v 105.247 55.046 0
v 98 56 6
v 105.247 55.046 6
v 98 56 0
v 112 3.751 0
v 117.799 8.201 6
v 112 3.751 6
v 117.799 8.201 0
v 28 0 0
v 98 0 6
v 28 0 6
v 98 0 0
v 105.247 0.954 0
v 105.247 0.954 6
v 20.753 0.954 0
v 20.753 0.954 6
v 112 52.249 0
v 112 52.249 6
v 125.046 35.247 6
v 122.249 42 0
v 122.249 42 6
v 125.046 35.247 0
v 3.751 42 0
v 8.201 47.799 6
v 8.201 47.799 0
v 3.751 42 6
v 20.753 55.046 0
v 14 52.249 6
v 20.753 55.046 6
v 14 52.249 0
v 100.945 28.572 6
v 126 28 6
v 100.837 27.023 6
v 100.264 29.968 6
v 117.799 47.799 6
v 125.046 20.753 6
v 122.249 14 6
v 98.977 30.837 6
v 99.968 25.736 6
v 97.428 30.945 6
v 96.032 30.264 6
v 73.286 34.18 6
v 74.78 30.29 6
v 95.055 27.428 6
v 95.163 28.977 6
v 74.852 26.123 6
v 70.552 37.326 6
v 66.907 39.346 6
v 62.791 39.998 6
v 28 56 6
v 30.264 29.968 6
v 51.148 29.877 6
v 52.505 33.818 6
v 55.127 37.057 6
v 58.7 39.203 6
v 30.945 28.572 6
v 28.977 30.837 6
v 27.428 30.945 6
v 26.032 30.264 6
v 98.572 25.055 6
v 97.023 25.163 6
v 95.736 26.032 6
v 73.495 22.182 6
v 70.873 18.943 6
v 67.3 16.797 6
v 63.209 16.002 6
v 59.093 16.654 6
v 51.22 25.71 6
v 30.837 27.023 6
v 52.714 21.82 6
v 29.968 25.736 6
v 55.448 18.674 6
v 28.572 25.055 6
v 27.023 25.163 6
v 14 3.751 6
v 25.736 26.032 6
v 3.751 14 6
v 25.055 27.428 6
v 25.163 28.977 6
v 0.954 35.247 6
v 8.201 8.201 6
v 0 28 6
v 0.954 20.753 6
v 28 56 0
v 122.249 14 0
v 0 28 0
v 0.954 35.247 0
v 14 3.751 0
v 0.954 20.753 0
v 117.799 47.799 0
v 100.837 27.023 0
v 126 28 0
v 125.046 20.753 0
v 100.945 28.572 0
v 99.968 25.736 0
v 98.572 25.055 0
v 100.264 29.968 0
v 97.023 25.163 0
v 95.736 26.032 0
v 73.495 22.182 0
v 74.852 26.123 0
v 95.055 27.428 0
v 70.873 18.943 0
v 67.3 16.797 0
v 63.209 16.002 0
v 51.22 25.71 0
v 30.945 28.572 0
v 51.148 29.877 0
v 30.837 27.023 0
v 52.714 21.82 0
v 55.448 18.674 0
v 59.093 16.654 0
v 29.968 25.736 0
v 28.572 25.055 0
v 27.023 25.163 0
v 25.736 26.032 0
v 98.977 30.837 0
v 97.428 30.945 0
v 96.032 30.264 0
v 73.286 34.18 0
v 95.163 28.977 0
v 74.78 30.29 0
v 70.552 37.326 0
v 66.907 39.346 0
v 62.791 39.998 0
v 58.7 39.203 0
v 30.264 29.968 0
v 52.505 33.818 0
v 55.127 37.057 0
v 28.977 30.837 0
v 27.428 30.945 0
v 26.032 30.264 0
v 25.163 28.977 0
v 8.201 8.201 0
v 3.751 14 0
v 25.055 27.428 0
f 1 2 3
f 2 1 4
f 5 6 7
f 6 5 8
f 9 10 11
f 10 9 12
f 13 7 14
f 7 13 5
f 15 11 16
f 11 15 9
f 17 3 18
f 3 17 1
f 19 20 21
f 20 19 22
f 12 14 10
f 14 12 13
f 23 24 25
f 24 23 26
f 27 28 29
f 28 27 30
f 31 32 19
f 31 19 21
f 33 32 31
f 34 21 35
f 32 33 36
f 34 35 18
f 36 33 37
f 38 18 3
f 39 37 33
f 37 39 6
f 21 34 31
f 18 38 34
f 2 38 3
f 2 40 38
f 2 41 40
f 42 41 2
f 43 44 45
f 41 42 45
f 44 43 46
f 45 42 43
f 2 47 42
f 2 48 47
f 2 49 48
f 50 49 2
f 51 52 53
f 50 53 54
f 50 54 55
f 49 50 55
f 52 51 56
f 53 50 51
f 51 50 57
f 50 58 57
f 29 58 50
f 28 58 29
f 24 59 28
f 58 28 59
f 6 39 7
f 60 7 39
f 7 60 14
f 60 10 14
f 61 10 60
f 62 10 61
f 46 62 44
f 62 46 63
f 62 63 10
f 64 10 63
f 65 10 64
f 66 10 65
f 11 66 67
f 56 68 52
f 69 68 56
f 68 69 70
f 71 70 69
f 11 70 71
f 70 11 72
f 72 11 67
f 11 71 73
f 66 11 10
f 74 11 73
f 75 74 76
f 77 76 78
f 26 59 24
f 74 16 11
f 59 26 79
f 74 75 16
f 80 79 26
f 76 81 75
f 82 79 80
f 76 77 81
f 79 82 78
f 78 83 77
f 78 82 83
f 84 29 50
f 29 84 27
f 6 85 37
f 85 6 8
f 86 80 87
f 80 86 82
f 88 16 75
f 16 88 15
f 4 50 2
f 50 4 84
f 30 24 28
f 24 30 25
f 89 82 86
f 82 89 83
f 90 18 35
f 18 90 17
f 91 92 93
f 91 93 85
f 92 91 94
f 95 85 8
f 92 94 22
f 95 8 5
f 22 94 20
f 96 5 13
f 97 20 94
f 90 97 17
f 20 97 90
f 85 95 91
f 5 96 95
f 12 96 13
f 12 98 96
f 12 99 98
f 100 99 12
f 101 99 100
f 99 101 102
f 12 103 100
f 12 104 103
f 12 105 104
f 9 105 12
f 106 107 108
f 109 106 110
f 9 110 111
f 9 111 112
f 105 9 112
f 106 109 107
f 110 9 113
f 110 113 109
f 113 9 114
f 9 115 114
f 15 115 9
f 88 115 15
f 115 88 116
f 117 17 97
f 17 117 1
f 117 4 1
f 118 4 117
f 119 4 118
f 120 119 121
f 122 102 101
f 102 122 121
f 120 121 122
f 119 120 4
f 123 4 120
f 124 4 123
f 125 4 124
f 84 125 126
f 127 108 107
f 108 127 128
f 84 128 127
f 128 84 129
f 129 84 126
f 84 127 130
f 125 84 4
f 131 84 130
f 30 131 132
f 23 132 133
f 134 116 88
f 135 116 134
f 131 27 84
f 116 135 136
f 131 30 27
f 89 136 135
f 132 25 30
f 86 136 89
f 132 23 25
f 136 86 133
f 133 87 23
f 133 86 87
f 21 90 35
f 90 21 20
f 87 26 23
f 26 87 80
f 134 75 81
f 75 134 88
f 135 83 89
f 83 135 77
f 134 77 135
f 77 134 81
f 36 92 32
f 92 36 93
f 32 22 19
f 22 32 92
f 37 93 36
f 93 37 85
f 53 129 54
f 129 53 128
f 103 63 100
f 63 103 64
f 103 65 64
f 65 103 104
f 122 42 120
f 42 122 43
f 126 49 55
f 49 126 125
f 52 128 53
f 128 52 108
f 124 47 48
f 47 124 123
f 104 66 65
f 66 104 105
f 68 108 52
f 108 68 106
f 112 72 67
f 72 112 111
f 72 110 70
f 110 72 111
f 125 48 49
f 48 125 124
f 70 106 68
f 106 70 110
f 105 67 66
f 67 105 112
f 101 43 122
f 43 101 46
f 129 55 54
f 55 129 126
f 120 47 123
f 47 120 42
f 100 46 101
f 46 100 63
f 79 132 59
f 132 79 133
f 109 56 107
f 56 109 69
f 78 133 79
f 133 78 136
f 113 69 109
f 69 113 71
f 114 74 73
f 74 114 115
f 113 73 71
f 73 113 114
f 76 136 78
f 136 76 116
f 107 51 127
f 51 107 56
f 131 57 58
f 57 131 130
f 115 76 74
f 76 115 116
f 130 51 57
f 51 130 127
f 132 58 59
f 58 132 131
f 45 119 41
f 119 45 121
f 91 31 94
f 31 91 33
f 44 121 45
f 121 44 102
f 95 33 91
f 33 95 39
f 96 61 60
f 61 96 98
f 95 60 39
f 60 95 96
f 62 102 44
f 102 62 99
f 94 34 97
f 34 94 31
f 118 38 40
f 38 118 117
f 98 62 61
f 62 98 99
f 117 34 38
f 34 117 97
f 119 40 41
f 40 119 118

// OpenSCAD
$fn = 32;

// ----------------------------------------------------------------------
// Spacer plate: obround span 70, caps R28
// ----------------------------------------------------------------------

// --- parameters (mm) ---
bore_r = 12;              // centre bore radius
bolt_r = 3;               // bolt hole radius
plate_t = 6;              // plate thickness, Z (extrusion height)
span = 70;                // obround span
cap_r = 28;               // cap radius
fit_tol = 0.1;            // declared fit tolerance (prompt contract)
free_tol = 0.5;           // declared free tolerance (prompt contract)

profile = [[28, 56], [20.753, 55.046], [14, 52.249], [8.201, 47.799], [3.751, 42], [0.954, 35.247], [0, 28], [0.954, 20.753], [3.751, 14], [8.201, 8.201], [14, 3.751], [20.753, 0.954], [28, 0], [98, 0], [105.247, 0.954], [112, 3.751], [117.799, 8.201], [122.249, 14], [125.046, 20.753], [126, 28], [125.046, 35.247], [122.249, 42], [117.799, 47.799], [112, 52.249], [105.247, 55.046], [98, 56]];  // primary outline, 26 points, counter clockwise
void_1 = [[74.78, 30.29], [73.286, 34.18], [70.552, 37.326], [66.907, 39.346], [62.791, 39.998], [58.7, 39.203], [55.127, 37.057], [52.505, 33.818], [51.148, 29.877], [51.22, 25.71], [52.714, 21.82], [55.448, 18.674], [59.093, 16.654], [63.209, 16.002], [67.3, 16.797], [70.873, 18.943], [73.495, 22.182], [74.852, 26.123]];  // centre bore, 18 points
void_2 = [[30.945, 28.572], [30.264, 29.968], [28.977, 30.837], [27.428, 30.945], [26.032, 30.264], [25.163, 28.977], [25.055, 27.428], [25.736, 26.032], [27.023, 25.163], [28.572, 25.055], [29.968, 25.736], [30.837, 27.023]];  // end hole, 12 points
void_3 = [[100.945, 28.572], [100.264, 29.968], [98.977, 30.837], [97.428, 30.945], [96.032, 30.264], [95.163, 28.977], [95.055, 27.428], [95.736, 26.032], [97.023, 25.163], [98.572, 25.055], [99.968, 25.736], [100.837, 27.023]];  // end hole, 12 points

// --- the one profile operation ---
difference() {
  linear_extrude(height = plate_t) polygon(points = profile);
  translate([0, 0, -1])
    linear_extrude(height = plate_t + 2) polygon(points = void_1);
  translate([0, 0, -1])
    linear_extrude(height = plate_t + 2) polygon(points = void_2);
  translate([0, 0, -1])
    linear_extrude(height = plate_t + 2) polygon(points = void_3);
}
